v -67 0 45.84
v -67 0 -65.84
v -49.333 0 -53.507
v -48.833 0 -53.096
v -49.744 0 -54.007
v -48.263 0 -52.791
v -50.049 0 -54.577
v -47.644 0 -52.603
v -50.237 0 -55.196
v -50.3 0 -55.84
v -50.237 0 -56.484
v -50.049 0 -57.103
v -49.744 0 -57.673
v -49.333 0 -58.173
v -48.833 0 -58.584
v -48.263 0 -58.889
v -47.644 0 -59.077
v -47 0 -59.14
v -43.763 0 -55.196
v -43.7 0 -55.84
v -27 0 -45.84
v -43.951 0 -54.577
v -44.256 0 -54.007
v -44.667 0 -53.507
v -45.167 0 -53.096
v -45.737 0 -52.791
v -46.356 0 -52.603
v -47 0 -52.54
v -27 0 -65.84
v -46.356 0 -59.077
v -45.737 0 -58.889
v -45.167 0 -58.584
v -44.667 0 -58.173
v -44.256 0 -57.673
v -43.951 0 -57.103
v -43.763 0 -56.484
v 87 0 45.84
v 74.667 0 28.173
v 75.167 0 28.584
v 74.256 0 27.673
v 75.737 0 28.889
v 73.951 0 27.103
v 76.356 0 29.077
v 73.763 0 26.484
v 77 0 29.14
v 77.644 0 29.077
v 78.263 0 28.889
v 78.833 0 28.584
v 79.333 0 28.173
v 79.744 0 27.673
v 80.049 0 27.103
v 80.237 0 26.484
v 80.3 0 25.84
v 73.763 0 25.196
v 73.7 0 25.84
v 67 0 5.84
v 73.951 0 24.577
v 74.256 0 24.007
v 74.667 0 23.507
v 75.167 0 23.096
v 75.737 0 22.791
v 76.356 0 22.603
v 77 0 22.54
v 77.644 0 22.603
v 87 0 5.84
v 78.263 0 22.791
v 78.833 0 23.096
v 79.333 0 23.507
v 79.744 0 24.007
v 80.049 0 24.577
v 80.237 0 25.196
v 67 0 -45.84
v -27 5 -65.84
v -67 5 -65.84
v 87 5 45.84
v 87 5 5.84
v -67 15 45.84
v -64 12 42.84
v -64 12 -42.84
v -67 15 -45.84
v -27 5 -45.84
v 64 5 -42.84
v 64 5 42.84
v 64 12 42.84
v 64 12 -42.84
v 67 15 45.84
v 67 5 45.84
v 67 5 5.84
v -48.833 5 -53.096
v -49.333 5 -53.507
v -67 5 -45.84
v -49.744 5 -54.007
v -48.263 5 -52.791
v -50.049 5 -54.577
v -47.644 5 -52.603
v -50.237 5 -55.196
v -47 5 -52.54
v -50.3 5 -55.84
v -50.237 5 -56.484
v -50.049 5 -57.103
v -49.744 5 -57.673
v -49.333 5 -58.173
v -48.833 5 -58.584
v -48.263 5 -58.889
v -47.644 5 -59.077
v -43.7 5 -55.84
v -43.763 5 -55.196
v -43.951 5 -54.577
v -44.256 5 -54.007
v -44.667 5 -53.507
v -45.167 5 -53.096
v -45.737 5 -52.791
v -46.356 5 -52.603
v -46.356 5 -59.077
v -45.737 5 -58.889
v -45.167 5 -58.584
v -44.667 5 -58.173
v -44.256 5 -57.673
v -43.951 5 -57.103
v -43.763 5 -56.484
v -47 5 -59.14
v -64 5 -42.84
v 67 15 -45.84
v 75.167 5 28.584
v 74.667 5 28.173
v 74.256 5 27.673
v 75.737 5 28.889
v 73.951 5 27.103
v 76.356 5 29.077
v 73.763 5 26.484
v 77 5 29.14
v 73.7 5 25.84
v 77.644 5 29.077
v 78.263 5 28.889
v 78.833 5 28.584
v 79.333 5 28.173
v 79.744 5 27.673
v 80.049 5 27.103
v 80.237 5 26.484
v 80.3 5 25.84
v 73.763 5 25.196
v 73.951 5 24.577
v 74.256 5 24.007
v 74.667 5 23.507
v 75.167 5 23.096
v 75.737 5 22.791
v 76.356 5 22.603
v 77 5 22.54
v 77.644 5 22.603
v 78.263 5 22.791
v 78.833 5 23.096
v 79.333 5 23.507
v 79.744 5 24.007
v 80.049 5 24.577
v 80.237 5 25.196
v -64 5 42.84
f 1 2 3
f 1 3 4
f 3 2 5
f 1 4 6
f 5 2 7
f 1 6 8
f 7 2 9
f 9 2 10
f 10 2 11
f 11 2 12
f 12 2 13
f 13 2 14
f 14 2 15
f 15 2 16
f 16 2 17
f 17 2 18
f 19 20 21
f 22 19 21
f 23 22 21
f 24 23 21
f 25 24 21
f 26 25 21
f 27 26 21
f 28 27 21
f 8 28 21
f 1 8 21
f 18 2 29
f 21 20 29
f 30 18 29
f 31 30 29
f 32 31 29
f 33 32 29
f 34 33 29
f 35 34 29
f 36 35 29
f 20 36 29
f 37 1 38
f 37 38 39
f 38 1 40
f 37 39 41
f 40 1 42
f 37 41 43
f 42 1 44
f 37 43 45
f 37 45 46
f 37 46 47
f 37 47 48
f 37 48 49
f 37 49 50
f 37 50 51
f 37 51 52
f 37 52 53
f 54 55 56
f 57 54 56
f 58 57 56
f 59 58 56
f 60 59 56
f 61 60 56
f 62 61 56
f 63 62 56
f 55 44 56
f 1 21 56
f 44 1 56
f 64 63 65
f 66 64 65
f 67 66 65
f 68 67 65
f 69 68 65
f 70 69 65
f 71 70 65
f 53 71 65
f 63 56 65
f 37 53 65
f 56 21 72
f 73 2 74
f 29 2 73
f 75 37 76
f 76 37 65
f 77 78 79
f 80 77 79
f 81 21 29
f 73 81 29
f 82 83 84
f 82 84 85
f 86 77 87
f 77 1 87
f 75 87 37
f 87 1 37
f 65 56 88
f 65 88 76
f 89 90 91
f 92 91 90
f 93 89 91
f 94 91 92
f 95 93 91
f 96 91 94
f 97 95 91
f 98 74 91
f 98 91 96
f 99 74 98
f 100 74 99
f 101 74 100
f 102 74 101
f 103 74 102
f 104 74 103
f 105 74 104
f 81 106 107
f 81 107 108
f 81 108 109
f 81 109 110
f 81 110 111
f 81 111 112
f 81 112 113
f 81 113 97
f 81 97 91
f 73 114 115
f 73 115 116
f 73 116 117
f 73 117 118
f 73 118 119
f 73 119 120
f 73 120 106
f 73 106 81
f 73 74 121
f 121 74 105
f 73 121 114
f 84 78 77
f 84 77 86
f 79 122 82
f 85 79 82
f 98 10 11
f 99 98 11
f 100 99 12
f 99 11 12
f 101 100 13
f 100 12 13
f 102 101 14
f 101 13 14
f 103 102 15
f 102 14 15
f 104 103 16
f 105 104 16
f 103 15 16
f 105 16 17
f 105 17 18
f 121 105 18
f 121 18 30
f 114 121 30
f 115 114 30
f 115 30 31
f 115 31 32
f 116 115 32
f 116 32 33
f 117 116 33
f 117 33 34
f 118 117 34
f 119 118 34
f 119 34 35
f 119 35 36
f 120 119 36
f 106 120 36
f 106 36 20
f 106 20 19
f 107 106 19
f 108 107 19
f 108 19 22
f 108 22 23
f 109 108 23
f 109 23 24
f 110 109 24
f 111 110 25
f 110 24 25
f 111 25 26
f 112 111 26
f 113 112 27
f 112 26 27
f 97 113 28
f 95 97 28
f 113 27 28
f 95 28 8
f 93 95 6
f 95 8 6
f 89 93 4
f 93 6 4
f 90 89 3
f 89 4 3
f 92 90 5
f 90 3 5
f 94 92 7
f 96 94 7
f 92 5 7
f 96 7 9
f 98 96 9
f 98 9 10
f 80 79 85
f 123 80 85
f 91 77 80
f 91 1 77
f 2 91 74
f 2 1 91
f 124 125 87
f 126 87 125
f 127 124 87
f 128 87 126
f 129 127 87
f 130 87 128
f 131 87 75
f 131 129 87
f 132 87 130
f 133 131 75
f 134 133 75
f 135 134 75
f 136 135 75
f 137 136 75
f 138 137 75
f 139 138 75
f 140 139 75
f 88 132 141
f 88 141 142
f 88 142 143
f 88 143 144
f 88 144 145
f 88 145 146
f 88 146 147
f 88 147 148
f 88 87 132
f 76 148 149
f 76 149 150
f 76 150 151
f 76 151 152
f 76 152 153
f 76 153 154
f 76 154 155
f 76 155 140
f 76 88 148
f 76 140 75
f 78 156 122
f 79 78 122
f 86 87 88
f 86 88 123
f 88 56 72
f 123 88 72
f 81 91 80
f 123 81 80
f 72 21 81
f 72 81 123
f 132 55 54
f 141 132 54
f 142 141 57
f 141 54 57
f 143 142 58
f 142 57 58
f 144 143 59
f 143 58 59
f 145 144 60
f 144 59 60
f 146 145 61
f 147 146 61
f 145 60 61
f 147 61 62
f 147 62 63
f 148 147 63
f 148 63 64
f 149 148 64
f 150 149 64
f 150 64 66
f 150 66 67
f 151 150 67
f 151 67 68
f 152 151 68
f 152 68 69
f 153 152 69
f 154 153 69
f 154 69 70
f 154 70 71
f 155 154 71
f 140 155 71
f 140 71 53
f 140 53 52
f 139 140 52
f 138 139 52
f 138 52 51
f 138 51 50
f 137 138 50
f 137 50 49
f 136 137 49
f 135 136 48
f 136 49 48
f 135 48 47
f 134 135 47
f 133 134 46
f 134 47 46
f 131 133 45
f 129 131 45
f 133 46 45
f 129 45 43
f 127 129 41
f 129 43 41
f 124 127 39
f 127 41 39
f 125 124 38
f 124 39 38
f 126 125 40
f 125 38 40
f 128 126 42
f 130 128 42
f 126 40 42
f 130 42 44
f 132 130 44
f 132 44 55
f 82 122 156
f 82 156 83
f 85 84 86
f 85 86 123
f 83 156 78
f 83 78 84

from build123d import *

# Parameters (mm, degrees)
SKETCH1_W            = 134
SKETCH1_H            = 91.68
BOSS_EXTRUDE1_DEPTH  = 5
SKETCH2_W            = 40
SKETCH2_H            = 20
SKETCH2_W_2          = 20
SKETCH2_H_2          = 40
BOSS_EXTRUDE2_DEPTH  = 5
M6_CLEARANCE_HOLE1_D = 6.6
SKETCH6_W            = 134
SKETCH6_H            = 91.68
SKETCH6_W_2          = 128
SKETCH6_H_2          = 85.68
BOSS_EXTRUDE3_DEPTH  = 10
CHAMFER1_SIZE        = 3


with BuildPart() as part:
    # Sketch1 → Boss-Extrude1 (new body)
    with BuildSketch(Plane(origin=(0, 0, 0), x_dir=(1, 0, 0), z_dir=(0, 1, 0))):
        Rectangle(SKETCH1_W, SKETCH1_H)
    extrude(amount=BOSS_EXTRUDE1_DEPTH)

    # Sketch2 → Boss-Extrude2 (add)
    with BuildSketch(Plane(origin=(0, 0, 0), x_dir=(1, 0, 0), z_dir=(0, 1, 0))):
        with Locations((-47, 55.84)):
            Rectangle(SKETCH2_W, SKETCH2_H)
        with Locations((77, -25.84)):
            Rectangle(SKETCH2_W_2, SKETCH2_H_2)
    extrude(amount=BOSS_EXTRUDE2_DEPTH)

    # M6 Clearance Hole1 (through all)
    with Locations(Plane(origin=(0, 5, 0), x_dir=(1, 0, 0), z_dir=(0, 1, 0))):
        with Locations((-47, 55.84), (77, -25.84)):
            Hole(M6_CLEARANCE_HOLE1_D / 2)

    # Sketch6 → Boss-Extrude3 (add)
    with BuildSketch(Plane(origin=(0, 5, 0), x_dir=(1, 0, 0), z_dir=(0, 1, 0))):
        Rectangle(SKETCH6_W, SKETCH6_H)
        Rectangle(SKETCH6_W_2, SKETCH6_H_2, mode=Mode.SUBTRACT)
    extrude(amount=BOSS_EXTRUDE3_DEPTH)

    # Chamfer1
    chamfer1_edges = [part.edges().sort_by_distance(p)[0] for p in [
        (-64, 15, 0),
        (0, 15, 42.84),
        (64, 15, 0),
        (0, 15, -42.84),
    ]]
    chamfer(chamfer1_edges, length=CHAMFER1_SIZE - 0.0001)  # a hair under: the kernel refuses the full size


solid = part.part
